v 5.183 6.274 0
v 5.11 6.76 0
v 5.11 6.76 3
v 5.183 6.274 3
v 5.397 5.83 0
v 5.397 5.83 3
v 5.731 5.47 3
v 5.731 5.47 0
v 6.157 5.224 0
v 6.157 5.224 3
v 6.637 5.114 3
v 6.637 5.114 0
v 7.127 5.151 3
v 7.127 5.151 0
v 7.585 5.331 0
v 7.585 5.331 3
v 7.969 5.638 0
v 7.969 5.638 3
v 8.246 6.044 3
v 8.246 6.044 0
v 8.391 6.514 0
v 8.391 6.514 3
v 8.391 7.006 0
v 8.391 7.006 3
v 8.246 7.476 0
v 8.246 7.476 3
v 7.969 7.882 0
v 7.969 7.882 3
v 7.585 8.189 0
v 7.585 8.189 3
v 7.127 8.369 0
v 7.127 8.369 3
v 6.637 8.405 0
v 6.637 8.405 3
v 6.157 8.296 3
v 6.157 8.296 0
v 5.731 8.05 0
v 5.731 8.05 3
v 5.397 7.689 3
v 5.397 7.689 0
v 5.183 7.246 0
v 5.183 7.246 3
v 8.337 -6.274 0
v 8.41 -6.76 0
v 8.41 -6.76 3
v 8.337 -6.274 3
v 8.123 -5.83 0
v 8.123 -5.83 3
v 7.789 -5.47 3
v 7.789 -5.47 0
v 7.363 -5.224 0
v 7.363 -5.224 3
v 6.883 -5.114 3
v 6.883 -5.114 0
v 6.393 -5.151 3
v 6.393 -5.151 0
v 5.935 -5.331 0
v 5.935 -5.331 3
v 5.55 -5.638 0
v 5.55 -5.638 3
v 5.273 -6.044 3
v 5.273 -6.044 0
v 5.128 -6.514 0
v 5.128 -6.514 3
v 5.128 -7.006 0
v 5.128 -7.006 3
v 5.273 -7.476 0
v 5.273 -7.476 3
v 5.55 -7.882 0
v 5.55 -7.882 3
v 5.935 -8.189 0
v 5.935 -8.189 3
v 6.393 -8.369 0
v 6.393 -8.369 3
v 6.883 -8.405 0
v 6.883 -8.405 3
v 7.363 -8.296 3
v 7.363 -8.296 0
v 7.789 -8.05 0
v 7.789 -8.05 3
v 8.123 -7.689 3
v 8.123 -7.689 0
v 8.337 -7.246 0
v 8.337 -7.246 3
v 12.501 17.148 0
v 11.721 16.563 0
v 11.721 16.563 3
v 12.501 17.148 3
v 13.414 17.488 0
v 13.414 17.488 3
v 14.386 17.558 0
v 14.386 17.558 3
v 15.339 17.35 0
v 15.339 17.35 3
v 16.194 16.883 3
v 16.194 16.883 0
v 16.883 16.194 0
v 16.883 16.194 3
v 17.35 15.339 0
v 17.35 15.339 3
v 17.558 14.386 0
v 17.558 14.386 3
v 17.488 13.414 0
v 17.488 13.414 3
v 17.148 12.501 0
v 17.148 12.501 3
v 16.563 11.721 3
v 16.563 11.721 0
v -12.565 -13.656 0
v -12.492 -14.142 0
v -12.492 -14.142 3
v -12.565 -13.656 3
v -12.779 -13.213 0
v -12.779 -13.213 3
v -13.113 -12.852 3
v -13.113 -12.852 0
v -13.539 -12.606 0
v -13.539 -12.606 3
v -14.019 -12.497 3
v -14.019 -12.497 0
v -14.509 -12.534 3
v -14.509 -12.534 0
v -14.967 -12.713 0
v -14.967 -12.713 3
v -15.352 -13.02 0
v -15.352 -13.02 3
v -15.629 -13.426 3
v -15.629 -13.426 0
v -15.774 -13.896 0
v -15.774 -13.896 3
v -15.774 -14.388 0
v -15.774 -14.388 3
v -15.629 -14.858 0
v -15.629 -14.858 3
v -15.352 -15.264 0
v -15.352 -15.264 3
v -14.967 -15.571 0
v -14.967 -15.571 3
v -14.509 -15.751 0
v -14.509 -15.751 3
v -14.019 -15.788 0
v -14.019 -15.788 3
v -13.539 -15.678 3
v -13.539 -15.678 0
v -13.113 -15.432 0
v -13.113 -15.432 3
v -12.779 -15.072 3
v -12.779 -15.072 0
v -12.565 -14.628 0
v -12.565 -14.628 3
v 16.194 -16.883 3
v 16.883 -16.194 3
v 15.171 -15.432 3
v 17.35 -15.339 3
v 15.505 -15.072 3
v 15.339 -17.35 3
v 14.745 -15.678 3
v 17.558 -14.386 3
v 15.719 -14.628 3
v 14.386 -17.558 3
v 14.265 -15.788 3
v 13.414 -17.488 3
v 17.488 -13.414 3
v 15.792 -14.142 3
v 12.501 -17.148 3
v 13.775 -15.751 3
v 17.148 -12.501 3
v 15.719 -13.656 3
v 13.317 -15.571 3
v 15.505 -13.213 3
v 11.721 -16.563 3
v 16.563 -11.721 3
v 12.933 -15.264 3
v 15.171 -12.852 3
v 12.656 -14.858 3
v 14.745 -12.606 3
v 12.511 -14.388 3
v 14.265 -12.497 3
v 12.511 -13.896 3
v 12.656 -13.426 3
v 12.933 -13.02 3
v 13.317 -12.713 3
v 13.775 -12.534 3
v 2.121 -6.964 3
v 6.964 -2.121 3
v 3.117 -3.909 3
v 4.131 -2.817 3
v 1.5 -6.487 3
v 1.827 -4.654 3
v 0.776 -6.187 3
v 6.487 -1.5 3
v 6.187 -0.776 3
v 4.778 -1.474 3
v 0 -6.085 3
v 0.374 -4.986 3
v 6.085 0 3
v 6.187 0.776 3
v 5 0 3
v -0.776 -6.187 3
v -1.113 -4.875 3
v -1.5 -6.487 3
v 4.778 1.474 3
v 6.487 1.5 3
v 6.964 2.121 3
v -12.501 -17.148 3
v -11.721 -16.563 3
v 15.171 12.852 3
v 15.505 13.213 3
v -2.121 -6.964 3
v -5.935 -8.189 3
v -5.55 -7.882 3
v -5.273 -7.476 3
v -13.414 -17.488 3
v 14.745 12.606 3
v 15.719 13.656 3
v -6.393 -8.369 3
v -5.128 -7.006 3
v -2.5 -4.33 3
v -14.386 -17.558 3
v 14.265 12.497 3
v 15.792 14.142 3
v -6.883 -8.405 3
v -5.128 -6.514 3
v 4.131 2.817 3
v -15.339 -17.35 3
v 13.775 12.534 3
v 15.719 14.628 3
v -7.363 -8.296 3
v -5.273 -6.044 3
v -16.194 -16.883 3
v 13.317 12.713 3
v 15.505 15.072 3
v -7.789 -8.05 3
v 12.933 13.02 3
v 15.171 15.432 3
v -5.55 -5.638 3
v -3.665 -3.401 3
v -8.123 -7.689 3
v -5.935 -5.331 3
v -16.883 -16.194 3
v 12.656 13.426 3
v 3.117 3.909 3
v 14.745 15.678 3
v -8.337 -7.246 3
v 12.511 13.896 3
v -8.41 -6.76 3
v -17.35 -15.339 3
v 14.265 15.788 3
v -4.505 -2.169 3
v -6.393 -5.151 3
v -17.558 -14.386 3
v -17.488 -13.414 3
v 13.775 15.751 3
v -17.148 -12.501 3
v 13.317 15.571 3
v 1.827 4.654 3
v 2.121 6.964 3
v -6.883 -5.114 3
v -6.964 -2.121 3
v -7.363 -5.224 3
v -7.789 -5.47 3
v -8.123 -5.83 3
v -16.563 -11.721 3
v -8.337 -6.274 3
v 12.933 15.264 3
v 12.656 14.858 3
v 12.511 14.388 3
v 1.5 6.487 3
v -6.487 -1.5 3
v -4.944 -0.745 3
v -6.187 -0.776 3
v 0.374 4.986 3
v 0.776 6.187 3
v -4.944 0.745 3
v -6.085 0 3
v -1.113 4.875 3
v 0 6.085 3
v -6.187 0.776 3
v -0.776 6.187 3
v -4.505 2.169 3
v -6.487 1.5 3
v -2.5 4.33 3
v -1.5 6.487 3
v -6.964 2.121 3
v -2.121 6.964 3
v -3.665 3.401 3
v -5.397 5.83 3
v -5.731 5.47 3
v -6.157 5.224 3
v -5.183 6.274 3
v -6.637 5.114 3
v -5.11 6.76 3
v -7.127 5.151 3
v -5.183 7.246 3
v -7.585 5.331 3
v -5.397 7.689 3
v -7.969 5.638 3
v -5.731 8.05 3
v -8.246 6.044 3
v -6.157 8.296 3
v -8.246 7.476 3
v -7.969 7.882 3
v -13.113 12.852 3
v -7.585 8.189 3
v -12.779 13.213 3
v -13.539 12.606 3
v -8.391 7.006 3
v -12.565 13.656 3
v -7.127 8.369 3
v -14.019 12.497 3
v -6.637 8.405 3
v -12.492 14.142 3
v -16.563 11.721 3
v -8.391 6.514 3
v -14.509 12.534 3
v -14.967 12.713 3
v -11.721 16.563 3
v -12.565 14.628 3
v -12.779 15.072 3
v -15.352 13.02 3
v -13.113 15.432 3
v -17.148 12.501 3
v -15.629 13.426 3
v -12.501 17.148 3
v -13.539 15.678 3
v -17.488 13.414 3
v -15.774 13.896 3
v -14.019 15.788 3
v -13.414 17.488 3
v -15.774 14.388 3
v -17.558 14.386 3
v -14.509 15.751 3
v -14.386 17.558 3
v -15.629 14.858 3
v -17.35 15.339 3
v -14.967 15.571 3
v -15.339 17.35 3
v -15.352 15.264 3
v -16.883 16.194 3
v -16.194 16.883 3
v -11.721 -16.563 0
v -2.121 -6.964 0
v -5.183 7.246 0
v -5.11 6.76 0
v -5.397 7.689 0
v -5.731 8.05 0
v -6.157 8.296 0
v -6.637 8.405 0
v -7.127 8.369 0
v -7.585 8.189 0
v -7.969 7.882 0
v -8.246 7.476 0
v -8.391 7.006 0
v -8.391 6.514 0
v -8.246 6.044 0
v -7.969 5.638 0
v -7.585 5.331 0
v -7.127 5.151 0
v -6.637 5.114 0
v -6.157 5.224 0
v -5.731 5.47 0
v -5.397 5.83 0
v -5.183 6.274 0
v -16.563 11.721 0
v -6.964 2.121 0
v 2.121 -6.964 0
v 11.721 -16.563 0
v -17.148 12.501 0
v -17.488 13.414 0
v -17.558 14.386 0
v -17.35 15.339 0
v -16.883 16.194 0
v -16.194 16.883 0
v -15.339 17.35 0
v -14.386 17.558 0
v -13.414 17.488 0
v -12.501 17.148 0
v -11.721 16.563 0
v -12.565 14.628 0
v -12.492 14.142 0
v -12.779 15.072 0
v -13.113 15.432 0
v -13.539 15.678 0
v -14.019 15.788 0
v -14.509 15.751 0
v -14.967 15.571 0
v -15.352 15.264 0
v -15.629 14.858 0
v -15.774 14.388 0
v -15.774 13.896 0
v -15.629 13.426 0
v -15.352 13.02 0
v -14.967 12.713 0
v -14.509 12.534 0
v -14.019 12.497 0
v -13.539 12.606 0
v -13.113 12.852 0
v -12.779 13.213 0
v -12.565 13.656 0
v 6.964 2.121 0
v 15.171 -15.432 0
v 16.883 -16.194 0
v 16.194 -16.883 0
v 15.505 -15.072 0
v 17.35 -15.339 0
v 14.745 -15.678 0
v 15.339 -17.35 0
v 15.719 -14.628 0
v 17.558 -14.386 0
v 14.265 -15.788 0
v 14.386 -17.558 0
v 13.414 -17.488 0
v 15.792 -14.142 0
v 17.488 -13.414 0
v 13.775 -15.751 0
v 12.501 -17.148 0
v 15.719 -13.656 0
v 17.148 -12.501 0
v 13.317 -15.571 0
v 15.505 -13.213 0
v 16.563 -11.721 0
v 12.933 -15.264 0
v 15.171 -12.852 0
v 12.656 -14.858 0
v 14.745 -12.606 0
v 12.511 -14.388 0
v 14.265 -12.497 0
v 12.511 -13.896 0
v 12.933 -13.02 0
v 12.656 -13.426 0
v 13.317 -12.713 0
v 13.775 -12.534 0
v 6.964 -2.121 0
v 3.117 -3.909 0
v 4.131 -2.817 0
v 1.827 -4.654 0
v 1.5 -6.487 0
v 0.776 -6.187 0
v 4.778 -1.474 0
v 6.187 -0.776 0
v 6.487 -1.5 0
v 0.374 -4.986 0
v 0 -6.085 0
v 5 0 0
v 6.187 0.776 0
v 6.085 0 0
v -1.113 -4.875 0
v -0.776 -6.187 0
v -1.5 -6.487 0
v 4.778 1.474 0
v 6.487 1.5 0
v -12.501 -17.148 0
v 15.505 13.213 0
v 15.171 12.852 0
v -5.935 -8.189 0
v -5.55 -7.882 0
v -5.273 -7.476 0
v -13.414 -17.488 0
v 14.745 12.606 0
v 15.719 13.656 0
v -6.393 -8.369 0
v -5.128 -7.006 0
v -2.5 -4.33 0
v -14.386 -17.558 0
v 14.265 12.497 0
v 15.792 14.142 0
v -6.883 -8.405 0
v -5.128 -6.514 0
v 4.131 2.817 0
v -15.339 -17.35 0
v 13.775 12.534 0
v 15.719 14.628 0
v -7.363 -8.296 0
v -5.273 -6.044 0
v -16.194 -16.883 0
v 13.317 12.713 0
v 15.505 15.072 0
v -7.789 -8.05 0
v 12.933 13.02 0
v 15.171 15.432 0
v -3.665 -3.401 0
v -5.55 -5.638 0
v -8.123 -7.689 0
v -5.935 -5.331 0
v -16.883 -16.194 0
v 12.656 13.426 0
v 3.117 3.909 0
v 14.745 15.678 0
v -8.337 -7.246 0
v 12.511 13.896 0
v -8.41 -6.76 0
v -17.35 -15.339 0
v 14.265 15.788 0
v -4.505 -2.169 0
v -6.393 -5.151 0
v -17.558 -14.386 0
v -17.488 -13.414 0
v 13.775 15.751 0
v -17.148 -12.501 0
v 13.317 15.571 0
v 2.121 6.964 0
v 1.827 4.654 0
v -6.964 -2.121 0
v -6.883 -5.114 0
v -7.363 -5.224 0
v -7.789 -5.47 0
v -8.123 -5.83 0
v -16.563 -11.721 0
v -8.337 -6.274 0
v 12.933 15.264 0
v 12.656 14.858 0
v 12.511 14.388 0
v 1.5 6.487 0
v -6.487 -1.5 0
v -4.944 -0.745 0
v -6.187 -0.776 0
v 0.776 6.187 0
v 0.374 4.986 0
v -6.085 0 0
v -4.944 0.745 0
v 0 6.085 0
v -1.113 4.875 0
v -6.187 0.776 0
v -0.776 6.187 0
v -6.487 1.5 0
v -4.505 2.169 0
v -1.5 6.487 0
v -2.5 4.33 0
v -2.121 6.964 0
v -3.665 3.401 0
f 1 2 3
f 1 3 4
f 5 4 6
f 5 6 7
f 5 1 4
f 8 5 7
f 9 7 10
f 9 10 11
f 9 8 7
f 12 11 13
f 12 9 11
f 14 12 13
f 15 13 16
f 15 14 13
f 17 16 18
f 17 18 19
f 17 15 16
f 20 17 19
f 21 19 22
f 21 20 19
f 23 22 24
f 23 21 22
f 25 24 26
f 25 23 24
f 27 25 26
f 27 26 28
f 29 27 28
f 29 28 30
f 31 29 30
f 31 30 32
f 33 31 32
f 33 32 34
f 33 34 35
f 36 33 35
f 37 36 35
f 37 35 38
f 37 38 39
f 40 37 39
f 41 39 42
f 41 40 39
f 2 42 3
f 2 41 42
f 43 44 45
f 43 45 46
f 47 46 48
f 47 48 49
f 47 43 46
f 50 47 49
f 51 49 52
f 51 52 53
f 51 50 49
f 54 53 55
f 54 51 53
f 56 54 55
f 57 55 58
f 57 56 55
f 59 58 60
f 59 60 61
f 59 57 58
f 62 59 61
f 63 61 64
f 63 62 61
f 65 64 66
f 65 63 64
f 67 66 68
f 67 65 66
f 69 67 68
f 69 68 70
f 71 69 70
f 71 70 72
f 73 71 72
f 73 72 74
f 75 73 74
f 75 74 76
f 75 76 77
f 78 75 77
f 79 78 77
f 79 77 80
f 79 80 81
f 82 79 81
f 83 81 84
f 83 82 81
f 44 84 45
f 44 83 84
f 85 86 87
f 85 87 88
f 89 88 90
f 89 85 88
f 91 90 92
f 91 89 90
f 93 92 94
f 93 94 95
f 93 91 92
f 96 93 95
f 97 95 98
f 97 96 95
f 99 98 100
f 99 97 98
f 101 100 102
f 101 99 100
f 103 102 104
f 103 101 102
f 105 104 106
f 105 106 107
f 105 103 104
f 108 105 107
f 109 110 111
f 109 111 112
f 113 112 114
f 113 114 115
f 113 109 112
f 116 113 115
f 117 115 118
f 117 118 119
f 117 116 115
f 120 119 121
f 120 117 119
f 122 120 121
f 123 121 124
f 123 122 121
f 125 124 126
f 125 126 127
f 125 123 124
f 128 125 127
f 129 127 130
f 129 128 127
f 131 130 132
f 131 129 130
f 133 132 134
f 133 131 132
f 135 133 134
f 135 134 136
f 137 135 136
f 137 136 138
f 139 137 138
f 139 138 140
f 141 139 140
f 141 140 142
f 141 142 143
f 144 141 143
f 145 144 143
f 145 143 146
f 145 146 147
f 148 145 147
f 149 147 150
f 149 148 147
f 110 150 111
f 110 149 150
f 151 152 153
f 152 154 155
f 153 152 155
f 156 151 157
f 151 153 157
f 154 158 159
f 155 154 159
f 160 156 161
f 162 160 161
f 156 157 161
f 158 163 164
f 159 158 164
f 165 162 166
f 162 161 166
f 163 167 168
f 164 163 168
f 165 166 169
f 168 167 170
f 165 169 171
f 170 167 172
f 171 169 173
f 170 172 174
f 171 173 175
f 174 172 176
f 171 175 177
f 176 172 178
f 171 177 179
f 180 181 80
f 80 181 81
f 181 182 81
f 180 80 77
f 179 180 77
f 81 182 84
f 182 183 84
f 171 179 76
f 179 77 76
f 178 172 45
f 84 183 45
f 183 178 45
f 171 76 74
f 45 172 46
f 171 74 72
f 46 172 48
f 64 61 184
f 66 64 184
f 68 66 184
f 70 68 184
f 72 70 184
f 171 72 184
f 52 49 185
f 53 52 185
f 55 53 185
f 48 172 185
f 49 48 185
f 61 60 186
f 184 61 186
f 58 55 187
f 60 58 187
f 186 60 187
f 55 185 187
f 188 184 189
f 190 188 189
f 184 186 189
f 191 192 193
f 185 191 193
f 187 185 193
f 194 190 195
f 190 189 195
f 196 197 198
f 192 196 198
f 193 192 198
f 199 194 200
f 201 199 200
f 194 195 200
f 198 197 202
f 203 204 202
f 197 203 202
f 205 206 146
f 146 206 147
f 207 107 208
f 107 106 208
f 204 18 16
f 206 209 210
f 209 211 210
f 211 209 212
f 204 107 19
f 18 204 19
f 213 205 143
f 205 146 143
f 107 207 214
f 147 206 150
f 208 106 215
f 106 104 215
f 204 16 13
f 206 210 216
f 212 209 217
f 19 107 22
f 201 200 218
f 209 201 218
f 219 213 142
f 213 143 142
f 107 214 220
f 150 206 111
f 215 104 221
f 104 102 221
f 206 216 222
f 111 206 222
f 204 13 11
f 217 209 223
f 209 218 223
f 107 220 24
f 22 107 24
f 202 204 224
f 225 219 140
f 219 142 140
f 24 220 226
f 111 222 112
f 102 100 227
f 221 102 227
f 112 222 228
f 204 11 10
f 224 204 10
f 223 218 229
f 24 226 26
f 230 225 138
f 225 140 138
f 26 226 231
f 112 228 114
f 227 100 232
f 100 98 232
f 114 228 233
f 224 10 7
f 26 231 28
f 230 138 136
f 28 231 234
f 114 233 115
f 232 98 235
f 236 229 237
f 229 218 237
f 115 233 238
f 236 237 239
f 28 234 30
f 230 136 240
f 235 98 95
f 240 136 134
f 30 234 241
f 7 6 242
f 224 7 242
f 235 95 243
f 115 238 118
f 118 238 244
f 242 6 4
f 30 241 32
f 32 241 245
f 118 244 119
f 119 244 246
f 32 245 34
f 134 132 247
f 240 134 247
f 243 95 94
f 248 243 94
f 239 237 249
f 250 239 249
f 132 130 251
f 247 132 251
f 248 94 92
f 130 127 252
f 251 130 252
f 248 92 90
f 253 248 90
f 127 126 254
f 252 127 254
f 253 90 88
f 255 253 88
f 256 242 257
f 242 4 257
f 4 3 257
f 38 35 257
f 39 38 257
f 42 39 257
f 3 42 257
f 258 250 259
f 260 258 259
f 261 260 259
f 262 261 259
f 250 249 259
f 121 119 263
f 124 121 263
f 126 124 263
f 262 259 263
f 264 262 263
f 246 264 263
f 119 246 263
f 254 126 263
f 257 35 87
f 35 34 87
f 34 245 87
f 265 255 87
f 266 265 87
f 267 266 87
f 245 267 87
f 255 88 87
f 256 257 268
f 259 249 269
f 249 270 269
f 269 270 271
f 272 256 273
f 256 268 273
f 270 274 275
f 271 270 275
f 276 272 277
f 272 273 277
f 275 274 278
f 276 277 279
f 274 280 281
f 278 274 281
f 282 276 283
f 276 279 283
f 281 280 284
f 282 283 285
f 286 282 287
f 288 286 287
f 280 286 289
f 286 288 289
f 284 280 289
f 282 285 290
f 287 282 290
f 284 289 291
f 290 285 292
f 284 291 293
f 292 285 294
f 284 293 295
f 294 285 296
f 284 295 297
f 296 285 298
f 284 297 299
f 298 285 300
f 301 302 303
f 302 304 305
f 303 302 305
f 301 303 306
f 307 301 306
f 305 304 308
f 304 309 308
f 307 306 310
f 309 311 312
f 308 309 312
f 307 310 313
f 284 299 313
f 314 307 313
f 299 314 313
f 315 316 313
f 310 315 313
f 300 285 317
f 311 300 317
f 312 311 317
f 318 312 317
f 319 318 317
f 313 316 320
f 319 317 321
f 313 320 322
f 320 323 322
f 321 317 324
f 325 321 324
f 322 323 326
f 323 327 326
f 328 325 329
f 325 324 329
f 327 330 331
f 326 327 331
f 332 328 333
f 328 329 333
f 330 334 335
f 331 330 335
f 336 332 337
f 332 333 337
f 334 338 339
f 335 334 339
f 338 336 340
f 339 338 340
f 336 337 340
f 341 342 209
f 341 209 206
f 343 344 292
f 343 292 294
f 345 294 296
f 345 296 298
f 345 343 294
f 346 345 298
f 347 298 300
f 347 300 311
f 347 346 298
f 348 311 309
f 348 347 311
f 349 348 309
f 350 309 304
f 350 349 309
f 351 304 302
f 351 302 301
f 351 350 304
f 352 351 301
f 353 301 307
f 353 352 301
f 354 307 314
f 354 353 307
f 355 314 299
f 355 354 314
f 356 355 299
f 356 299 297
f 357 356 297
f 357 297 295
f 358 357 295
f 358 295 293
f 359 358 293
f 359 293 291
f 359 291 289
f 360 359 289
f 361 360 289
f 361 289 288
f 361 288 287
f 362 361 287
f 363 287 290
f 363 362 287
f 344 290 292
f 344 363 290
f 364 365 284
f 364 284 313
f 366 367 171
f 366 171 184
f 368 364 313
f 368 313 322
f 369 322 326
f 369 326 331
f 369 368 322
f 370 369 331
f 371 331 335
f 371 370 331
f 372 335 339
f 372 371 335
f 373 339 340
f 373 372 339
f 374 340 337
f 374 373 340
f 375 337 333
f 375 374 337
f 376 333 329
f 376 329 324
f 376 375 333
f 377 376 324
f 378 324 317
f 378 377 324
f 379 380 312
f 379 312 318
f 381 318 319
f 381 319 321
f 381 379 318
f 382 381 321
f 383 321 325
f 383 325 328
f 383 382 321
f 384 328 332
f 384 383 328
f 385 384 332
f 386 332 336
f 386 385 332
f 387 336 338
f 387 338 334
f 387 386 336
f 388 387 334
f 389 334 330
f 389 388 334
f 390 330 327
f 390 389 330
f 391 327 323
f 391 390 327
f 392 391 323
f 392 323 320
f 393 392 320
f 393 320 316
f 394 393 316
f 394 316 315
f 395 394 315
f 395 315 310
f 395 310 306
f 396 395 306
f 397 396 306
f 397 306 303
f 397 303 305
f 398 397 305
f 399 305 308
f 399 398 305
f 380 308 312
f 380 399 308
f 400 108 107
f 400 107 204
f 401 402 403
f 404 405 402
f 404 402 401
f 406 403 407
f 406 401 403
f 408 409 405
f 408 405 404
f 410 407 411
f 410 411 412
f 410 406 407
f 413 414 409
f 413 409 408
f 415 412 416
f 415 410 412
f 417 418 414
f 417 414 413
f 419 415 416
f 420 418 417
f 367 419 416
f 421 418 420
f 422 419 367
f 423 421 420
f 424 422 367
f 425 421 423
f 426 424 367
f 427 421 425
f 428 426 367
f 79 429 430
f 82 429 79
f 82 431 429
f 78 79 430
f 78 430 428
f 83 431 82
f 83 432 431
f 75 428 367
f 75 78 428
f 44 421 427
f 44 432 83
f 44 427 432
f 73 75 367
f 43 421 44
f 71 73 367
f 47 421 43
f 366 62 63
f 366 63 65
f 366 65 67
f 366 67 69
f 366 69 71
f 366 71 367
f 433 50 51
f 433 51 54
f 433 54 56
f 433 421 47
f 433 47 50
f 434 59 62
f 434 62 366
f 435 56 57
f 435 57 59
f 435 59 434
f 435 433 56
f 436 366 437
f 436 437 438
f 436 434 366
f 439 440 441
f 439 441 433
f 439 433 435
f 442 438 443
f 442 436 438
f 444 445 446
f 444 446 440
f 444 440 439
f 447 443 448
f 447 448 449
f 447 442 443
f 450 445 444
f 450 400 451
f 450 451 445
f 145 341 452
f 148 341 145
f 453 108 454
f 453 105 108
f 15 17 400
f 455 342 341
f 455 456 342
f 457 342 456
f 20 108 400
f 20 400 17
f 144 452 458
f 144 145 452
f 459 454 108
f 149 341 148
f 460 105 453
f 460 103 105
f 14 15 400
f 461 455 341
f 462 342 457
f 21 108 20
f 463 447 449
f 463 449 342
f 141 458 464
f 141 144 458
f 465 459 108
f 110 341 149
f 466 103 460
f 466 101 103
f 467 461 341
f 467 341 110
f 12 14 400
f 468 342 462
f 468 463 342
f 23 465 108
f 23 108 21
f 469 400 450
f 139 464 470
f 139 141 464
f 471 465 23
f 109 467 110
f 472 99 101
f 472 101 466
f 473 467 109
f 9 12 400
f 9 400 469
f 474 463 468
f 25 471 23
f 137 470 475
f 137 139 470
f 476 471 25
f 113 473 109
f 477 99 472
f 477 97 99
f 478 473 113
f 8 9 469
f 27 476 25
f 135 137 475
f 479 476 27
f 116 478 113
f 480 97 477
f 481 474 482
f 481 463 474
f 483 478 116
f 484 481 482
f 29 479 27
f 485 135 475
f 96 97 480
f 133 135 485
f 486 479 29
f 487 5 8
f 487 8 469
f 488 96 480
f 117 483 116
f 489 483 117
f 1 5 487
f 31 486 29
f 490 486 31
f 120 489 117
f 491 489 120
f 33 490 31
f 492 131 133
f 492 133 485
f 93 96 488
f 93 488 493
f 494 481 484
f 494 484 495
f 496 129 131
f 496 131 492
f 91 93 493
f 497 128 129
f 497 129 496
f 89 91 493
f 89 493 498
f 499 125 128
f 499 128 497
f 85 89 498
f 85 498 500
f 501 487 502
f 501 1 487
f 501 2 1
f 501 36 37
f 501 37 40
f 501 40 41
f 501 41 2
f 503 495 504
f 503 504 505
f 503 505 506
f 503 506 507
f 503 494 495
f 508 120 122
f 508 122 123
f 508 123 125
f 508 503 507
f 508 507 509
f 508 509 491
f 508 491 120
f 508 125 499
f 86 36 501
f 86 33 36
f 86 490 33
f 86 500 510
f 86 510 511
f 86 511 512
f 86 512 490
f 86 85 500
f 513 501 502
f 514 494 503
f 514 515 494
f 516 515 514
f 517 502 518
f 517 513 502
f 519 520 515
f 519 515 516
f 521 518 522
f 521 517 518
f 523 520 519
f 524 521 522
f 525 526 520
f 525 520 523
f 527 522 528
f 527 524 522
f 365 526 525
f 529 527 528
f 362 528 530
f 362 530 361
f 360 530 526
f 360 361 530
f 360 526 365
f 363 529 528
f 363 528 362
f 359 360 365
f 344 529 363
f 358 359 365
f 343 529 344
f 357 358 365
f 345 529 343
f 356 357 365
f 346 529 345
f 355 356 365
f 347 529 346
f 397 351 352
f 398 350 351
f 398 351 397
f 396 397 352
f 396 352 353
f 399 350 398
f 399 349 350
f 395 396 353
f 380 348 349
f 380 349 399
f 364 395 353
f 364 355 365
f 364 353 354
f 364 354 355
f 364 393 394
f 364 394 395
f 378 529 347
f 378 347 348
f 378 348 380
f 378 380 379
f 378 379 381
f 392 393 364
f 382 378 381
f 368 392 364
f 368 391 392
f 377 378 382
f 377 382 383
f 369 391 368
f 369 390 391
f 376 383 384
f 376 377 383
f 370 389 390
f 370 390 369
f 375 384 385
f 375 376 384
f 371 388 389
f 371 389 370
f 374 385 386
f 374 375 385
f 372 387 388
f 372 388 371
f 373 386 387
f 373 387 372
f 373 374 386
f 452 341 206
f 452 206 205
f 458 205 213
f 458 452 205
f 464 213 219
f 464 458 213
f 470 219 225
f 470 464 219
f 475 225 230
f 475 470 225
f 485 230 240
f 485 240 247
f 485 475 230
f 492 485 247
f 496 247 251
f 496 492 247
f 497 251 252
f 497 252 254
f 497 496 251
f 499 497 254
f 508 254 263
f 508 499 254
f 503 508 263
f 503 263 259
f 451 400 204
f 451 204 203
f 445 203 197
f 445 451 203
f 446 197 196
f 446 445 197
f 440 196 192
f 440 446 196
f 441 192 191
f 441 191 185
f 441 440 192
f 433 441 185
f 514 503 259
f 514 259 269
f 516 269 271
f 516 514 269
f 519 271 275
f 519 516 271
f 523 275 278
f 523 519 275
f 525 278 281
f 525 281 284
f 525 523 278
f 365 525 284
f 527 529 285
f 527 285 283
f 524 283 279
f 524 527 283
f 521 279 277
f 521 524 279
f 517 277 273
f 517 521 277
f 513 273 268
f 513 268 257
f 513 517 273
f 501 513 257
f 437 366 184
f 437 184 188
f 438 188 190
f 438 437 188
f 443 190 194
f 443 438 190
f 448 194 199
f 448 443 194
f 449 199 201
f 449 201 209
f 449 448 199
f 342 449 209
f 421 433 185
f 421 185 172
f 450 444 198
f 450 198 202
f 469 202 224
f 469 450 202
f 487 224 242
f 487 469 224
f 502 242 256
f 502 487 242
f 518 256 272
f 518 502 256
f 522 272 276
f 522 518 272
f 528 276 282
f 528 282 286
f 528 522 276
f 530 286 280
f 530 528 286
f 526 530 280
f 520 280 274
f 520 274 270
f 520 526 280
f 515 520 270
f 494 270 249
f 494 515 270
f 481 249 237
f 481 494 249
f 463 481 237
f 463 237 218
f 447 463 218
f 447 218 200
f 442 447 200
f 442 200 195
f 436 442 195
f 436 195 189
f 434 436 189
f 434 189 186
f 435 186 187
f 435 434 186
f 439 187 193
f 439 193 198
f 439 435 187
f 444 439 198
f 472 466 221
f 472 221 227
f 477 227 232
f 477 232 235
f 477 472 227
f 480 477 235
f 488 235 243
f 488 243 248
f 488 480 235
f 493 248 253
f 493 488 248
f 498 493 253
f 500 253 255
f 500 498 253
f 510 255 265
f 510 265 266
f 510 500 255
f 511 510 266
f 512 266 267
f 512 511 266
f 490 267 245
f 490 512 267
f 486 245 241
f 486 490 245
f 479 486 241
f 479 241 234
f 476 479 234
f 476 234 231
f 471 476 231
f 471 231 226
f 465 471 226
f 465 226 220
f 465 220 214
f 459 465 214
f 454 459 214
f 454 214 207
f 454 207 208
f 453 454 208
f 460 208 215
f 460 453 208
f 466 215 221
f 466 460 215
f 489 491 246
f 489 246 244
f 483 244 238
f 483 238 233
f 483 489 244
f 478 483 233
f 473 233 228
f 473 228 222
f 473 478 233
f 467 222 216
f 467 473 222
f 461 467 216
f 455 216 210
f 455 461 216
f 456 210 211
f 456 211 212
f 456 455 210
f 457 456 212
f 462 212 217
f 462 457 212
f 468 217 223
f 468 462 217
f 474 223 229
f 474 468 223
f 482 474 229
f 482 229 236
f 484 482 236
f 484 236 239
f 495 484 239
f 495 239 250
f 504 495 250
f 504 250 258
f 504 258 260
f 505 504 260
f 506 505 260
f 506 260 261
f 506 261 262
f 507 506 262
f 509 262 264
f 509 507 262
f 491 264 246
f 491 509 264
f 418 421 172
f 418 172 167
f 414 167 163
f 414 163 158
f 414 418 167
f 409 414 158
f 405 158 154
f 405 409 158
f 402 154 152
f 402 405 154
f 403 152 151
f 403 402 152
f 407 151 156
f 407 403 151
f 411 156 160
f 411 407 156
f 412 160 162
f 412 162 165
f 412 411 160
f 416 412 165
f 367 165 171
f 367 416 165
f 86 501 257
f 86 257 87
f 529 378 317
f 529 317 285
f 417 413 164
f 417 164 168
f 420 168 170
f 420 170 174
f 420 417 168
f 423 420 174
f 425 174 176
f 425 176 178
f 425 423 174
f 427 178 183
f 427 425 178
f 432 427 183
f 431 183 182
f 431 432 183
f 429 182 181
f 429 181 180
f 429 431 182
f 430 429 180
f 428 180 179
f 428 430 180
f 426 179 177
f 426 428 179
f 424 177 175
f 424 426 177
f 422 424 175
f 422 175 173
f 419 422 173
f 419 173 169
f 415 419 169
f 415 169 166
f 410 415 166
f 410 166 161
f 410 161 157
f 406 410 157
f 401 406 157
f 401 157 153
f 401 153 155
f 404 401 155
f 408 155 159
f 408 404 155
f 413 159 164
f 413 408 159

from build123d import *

# Parameters (mm, degrees)
SKETCH1_R           = 1.65
SKETCH1_R_2         = 5
BOSS_EXTRUDE1_DEPTH = 3


with BuildPart() as part:
    # Sketch1 → Boss-Extrude1 (new body)
    with BuildSketch(Plane.XY):
        with BuildLine():
            Line((16.563434593, 11.720833187), (6.963921749, 2.121320344))
            ThreePointArc((6.963921749, 2.121320344), (6.085242093, 0), (6.963921749, -2.121320344))
            Line((6.963921749, -2.121320344), (16.563434593, -11.720833187))
            ThreePointArc((16.563434593, -11.720833187), (16.563434593, -16.563434593), (11.720833187, -16.563434593))
            Line((11.720833187, -16.563434593), (2.121320344, -6.963921749))
            ThreePointArc((2.121320344, -6.963921749), (0, -6.085242093), (-2.121320344, -6.963921749))
            Line((-2.121320344, -6.963921749), (-11.720833187, -16.563434593))
            ThreePointArc((-11.720833187, -16.563434593), (-16.56343546, -16.563437193), (-16.563436326, -11.720834921))
            Line((-16.563436326, -11.720834921), (-6.963921749, -2.121320344))
            ThreePointArc((-6.963921749, -2.121320344), (-6.085242093, 0), (-6.963921749, 2.121320344))
            Line((-6.963921749, 2.121320344), (-16.563434593, 11.720833187))
            ThreePointArc((-16.563434593, 11.720833187), (-16.563434593, 16.563434593), (-11.720833187, 16.563434593))
            Line((-11.720833187, 16.563434593), (-2.121320344, 6.963921749))
            ThreePointArc((-2.121320344, 6.963921749), (0, 6.085242093), (2.121320344, 6.963921749))
            Line((2.121320344, 6.963921749), (11.720833187, 16.563434593))
            ThreePointArc((11.720833187, 16.563434593), (16.563436326, 16.563436326), (16.563434593, 11.720833187))
        make_face()
        with Locations((-14.14213389, 14.14213389)):
            Circle(SKETCH1_R, mode=Mode.SUBTRACT)
        with Locations((14.142135624, 14.142135624)):
            Circle(SKETCH1_R, mode=Mode.SUBTRACT)
        with Locations((-14.142135624, -14.142135624)):
            Circle(SKETCH1_R, mode=Mode.SUBTRACT)
        with Locations((14.14213389, -14.14213389)):
            Circle(SKETCH1_R, mode=Mode.SUBTRACT)
        Circle(SKETCH1_R_2, mode=Mode.SUBTRACT)
        with Locations((-6.759874347, 6.759874347)):
            Circle(SKETCH1_R, mode=Mode.SUBTRACT)
        with Locations(Location((6.759874347, 6.759874347, 0), (0, 0, 180))):
            Circle(SKETCH1_R, mode=Mode.SUBTRACT)
        with Locations((6.759874347, -6.759874347)):
            Circle(SKETCH1_R, mode=Mode.SUBTRACT)
        with Locations(Location((-6.759874347, -6.759874347, 0), (0, 0, 180))):
            Circle(SKETCH1_R, mode=Mode.SUBTRACT)
    extrude(amount=BOSS_EXTRUDE1_DEPTH)


solid = part.part
